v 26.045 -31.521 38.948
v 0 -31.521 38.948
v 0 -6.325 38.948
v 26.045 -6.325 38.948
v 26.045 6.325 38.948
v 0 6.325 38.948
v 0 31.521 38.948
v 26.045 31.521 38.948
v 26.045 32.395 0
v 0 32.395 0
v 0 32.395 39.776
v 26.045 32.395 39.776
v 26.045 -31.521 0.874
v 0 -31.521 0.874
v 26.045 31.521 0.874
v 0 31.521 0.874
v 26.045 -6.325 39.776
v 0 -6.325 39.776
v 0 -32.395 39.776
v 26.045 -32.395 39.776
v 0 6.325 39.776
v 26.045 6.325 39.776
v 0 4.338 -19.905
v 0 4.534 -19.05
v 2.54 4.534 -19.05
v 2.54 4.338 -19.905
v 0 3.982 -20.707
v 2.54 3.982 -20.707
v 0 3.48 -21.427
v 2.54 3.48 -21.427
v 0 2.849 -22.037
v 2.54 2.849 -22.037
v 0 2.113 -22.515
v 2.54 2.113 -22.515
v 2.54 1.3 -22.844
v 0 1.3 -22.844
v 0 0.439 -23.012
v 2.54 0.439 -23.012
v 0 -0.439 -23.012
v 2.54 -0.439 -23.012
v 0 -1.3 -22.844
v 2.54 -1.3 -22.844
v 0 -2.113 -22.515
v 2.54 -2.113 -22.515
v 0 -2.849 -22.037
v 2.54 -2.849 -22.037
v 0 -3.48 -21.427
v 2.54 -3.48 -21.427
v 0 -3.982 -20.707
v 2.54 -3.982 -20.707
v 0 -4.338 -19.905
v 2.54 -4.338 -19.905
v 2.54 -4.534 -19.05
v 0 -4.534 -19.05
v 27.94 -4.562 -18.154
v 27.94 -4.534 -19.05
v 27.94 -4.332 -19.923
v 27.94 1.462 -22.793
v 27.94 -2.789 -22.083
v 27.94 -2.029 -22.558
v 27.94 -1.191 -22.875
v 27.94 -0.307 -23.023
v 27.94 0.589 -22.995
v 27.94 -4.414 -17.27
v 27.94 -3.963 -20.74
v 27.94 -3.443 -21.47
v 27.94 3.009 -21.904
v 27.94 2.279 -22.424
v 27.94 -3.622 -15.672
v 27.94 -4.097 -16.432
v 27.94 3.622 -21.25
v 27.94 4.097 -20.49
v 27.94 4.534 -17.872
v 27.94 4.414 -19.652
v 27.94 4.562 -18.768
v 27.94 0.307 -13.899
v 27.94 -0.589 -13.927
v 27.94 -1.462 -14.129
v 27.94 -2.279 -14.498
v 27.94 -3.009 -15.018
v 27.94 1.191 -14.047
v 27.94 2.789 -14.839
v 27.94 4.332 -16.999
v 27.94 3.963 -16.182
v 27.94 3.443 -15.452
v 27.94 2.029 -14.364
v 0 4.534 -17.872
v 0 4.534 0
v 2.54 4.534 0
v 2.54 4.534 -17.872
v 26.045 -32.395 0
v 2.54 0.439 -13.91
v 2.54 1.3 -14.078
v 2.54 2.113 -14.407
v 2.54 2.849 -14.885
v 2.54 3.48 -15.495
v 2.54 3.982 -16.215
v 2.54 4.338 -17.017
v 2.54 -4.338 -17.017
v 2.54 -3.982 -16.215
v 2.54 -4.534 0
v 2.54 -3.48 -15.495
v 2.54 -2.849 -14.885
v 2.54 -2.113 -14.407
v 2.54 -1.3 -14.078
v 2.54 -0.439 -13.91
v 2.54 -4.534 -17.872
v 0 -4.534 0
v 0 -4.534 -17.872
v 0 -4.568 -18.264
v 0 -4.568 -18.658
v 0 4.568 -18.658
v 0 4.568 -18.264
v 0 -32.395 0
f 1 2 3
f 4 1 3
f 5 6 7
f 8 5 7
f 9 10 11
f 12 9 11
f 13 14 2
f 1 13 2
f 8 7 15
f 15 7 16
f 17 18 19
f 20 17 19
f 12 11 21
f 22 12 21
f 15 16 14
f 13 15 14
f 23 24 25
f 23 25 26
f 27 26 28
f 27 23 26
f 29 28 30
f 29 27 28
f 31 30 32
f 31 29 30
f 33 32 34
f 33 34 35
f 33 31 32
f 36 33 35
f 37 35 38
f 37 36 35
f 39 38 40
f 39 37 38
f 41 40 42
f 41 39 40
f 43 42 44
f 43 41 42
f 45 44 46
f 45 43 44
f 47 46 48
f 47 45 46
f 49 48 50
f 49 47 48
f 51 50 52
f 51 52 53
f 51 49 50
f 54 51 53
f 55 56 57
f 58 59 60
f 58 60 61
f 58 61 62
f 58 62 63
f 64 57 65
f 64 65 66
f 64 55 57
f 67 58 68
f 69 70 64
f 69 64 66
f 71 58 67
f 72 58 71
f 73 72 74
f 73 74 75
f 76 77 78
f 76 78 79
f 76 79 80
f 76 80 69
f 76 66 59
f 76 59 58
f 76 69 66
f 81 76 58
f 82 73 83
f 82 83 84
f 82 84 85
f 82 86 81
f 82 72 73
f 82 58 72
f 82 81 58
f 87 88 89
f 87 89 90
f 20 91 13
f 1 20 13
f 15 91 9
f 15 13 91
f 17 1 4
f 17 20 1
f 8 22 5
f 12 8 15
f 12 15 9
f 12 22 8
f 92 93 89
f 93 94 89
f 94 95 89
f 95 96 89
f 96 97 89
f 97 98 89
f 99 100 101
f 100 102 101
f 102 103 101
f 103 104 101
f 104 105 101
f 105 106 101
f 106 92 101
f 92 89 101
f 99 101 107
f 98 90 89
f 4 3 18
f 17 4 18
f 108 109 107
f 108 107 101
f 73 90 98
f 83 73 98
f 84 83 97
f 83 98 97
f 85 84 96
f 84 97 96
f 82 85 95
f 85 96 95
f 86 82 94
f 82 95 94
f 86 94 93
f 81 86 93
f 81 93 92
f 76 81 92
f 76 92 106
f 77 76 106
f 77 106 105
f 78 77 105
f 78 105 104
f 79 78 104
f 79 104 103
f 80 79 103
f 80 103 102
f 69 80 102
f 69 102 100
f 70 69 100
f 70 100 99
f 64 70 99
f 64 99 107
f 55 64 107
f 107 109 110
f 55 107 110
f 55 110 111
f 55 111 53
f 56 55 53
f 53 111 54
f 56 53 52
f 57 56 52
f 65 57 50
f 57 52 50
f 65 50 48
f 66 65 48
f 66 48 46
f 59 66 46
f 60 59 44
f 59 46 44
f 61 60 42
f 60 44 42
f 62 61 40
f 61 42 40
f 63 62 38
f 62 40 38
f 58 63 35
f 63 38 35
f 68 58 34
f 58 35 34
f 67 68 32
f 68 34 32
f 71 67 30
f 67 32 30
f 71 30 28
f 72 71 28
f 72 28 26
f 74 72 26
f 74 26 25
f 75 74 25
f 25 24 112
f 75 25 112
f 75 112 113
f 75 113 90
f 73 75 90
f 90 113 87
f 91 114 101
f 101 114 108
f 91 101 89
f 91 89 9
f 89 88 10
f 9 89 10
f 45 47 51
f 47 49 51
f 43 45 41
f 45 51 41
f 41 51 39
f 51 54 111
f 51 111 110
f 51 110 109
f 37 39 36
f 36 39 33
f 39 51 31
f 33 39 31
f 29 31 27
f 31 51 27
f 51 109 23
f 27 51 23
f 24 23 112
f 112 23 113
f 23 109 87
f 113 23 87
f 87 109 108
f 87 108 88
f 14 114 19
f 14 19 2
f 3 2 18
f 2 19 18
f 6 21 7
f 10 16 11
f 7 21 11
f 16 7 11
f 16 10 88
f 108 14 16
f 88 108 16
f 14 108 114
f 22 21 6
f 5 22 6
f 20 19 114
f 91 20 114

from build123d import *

# Parameters (mm, degrees)
BOSS_EXTRUDE1_DEPTH = 26.04516
BOSS_EXTRUDE2_DEPTH = 2.54
SKETCH5_R           = 4.572
BOSS_EXTRUDE3_DEPTH = 27.94


with BuildPart() as part:
    # Sketch1 → Boss-Extrude1 (new body)
    with BuildSketch(Plane.YZ):
        Polygon((-32.39516, 0), (32.39516, 0), (32.39516, 39.7764), (6.3246, 39.7764), (6.3246, 38.94836), (31.5214, 38.94836), (31.5214, 0.87376), (-31.5214, 0.87376), (-31.5214, 38.94836), (-6.3246, 38.94836), (-6.3246, 39.7764), (-32.39516, 39.7764), align=None)
    extrude(amount=BOSS_EXTRUDE1_DEPTH)

    # Sketch2 → Boss-Extrude2 (add)
    with BuildSketch(Plane.YZ):
        with BuildLine():
            Line((-4.5339, 0), (4.5339, 0))
            Line((4.5339, 0), (4.5339, -19.05))
            ThreePointArc((4.5339, -19.05), (0, -23.032988294), (-4.5339, -19.05))
            Line((-4.5339, -19.05), (-4.5339, 0))
        make_face()
    extrude(amount=BOSS_EXTRUDE2_DEPTH)

    # Sketch5 → Boss-Extrude3 (add)
    with BuildSketch(Plane.YZ):
        with Locations(Location((0, -18.460988294, 0), (0, 0, 7.401999688))):
            Circle(SKETCH5_R)
    extrude(amount=BOSS_EXTRUDE3_DEPTH)


solid = part.part
